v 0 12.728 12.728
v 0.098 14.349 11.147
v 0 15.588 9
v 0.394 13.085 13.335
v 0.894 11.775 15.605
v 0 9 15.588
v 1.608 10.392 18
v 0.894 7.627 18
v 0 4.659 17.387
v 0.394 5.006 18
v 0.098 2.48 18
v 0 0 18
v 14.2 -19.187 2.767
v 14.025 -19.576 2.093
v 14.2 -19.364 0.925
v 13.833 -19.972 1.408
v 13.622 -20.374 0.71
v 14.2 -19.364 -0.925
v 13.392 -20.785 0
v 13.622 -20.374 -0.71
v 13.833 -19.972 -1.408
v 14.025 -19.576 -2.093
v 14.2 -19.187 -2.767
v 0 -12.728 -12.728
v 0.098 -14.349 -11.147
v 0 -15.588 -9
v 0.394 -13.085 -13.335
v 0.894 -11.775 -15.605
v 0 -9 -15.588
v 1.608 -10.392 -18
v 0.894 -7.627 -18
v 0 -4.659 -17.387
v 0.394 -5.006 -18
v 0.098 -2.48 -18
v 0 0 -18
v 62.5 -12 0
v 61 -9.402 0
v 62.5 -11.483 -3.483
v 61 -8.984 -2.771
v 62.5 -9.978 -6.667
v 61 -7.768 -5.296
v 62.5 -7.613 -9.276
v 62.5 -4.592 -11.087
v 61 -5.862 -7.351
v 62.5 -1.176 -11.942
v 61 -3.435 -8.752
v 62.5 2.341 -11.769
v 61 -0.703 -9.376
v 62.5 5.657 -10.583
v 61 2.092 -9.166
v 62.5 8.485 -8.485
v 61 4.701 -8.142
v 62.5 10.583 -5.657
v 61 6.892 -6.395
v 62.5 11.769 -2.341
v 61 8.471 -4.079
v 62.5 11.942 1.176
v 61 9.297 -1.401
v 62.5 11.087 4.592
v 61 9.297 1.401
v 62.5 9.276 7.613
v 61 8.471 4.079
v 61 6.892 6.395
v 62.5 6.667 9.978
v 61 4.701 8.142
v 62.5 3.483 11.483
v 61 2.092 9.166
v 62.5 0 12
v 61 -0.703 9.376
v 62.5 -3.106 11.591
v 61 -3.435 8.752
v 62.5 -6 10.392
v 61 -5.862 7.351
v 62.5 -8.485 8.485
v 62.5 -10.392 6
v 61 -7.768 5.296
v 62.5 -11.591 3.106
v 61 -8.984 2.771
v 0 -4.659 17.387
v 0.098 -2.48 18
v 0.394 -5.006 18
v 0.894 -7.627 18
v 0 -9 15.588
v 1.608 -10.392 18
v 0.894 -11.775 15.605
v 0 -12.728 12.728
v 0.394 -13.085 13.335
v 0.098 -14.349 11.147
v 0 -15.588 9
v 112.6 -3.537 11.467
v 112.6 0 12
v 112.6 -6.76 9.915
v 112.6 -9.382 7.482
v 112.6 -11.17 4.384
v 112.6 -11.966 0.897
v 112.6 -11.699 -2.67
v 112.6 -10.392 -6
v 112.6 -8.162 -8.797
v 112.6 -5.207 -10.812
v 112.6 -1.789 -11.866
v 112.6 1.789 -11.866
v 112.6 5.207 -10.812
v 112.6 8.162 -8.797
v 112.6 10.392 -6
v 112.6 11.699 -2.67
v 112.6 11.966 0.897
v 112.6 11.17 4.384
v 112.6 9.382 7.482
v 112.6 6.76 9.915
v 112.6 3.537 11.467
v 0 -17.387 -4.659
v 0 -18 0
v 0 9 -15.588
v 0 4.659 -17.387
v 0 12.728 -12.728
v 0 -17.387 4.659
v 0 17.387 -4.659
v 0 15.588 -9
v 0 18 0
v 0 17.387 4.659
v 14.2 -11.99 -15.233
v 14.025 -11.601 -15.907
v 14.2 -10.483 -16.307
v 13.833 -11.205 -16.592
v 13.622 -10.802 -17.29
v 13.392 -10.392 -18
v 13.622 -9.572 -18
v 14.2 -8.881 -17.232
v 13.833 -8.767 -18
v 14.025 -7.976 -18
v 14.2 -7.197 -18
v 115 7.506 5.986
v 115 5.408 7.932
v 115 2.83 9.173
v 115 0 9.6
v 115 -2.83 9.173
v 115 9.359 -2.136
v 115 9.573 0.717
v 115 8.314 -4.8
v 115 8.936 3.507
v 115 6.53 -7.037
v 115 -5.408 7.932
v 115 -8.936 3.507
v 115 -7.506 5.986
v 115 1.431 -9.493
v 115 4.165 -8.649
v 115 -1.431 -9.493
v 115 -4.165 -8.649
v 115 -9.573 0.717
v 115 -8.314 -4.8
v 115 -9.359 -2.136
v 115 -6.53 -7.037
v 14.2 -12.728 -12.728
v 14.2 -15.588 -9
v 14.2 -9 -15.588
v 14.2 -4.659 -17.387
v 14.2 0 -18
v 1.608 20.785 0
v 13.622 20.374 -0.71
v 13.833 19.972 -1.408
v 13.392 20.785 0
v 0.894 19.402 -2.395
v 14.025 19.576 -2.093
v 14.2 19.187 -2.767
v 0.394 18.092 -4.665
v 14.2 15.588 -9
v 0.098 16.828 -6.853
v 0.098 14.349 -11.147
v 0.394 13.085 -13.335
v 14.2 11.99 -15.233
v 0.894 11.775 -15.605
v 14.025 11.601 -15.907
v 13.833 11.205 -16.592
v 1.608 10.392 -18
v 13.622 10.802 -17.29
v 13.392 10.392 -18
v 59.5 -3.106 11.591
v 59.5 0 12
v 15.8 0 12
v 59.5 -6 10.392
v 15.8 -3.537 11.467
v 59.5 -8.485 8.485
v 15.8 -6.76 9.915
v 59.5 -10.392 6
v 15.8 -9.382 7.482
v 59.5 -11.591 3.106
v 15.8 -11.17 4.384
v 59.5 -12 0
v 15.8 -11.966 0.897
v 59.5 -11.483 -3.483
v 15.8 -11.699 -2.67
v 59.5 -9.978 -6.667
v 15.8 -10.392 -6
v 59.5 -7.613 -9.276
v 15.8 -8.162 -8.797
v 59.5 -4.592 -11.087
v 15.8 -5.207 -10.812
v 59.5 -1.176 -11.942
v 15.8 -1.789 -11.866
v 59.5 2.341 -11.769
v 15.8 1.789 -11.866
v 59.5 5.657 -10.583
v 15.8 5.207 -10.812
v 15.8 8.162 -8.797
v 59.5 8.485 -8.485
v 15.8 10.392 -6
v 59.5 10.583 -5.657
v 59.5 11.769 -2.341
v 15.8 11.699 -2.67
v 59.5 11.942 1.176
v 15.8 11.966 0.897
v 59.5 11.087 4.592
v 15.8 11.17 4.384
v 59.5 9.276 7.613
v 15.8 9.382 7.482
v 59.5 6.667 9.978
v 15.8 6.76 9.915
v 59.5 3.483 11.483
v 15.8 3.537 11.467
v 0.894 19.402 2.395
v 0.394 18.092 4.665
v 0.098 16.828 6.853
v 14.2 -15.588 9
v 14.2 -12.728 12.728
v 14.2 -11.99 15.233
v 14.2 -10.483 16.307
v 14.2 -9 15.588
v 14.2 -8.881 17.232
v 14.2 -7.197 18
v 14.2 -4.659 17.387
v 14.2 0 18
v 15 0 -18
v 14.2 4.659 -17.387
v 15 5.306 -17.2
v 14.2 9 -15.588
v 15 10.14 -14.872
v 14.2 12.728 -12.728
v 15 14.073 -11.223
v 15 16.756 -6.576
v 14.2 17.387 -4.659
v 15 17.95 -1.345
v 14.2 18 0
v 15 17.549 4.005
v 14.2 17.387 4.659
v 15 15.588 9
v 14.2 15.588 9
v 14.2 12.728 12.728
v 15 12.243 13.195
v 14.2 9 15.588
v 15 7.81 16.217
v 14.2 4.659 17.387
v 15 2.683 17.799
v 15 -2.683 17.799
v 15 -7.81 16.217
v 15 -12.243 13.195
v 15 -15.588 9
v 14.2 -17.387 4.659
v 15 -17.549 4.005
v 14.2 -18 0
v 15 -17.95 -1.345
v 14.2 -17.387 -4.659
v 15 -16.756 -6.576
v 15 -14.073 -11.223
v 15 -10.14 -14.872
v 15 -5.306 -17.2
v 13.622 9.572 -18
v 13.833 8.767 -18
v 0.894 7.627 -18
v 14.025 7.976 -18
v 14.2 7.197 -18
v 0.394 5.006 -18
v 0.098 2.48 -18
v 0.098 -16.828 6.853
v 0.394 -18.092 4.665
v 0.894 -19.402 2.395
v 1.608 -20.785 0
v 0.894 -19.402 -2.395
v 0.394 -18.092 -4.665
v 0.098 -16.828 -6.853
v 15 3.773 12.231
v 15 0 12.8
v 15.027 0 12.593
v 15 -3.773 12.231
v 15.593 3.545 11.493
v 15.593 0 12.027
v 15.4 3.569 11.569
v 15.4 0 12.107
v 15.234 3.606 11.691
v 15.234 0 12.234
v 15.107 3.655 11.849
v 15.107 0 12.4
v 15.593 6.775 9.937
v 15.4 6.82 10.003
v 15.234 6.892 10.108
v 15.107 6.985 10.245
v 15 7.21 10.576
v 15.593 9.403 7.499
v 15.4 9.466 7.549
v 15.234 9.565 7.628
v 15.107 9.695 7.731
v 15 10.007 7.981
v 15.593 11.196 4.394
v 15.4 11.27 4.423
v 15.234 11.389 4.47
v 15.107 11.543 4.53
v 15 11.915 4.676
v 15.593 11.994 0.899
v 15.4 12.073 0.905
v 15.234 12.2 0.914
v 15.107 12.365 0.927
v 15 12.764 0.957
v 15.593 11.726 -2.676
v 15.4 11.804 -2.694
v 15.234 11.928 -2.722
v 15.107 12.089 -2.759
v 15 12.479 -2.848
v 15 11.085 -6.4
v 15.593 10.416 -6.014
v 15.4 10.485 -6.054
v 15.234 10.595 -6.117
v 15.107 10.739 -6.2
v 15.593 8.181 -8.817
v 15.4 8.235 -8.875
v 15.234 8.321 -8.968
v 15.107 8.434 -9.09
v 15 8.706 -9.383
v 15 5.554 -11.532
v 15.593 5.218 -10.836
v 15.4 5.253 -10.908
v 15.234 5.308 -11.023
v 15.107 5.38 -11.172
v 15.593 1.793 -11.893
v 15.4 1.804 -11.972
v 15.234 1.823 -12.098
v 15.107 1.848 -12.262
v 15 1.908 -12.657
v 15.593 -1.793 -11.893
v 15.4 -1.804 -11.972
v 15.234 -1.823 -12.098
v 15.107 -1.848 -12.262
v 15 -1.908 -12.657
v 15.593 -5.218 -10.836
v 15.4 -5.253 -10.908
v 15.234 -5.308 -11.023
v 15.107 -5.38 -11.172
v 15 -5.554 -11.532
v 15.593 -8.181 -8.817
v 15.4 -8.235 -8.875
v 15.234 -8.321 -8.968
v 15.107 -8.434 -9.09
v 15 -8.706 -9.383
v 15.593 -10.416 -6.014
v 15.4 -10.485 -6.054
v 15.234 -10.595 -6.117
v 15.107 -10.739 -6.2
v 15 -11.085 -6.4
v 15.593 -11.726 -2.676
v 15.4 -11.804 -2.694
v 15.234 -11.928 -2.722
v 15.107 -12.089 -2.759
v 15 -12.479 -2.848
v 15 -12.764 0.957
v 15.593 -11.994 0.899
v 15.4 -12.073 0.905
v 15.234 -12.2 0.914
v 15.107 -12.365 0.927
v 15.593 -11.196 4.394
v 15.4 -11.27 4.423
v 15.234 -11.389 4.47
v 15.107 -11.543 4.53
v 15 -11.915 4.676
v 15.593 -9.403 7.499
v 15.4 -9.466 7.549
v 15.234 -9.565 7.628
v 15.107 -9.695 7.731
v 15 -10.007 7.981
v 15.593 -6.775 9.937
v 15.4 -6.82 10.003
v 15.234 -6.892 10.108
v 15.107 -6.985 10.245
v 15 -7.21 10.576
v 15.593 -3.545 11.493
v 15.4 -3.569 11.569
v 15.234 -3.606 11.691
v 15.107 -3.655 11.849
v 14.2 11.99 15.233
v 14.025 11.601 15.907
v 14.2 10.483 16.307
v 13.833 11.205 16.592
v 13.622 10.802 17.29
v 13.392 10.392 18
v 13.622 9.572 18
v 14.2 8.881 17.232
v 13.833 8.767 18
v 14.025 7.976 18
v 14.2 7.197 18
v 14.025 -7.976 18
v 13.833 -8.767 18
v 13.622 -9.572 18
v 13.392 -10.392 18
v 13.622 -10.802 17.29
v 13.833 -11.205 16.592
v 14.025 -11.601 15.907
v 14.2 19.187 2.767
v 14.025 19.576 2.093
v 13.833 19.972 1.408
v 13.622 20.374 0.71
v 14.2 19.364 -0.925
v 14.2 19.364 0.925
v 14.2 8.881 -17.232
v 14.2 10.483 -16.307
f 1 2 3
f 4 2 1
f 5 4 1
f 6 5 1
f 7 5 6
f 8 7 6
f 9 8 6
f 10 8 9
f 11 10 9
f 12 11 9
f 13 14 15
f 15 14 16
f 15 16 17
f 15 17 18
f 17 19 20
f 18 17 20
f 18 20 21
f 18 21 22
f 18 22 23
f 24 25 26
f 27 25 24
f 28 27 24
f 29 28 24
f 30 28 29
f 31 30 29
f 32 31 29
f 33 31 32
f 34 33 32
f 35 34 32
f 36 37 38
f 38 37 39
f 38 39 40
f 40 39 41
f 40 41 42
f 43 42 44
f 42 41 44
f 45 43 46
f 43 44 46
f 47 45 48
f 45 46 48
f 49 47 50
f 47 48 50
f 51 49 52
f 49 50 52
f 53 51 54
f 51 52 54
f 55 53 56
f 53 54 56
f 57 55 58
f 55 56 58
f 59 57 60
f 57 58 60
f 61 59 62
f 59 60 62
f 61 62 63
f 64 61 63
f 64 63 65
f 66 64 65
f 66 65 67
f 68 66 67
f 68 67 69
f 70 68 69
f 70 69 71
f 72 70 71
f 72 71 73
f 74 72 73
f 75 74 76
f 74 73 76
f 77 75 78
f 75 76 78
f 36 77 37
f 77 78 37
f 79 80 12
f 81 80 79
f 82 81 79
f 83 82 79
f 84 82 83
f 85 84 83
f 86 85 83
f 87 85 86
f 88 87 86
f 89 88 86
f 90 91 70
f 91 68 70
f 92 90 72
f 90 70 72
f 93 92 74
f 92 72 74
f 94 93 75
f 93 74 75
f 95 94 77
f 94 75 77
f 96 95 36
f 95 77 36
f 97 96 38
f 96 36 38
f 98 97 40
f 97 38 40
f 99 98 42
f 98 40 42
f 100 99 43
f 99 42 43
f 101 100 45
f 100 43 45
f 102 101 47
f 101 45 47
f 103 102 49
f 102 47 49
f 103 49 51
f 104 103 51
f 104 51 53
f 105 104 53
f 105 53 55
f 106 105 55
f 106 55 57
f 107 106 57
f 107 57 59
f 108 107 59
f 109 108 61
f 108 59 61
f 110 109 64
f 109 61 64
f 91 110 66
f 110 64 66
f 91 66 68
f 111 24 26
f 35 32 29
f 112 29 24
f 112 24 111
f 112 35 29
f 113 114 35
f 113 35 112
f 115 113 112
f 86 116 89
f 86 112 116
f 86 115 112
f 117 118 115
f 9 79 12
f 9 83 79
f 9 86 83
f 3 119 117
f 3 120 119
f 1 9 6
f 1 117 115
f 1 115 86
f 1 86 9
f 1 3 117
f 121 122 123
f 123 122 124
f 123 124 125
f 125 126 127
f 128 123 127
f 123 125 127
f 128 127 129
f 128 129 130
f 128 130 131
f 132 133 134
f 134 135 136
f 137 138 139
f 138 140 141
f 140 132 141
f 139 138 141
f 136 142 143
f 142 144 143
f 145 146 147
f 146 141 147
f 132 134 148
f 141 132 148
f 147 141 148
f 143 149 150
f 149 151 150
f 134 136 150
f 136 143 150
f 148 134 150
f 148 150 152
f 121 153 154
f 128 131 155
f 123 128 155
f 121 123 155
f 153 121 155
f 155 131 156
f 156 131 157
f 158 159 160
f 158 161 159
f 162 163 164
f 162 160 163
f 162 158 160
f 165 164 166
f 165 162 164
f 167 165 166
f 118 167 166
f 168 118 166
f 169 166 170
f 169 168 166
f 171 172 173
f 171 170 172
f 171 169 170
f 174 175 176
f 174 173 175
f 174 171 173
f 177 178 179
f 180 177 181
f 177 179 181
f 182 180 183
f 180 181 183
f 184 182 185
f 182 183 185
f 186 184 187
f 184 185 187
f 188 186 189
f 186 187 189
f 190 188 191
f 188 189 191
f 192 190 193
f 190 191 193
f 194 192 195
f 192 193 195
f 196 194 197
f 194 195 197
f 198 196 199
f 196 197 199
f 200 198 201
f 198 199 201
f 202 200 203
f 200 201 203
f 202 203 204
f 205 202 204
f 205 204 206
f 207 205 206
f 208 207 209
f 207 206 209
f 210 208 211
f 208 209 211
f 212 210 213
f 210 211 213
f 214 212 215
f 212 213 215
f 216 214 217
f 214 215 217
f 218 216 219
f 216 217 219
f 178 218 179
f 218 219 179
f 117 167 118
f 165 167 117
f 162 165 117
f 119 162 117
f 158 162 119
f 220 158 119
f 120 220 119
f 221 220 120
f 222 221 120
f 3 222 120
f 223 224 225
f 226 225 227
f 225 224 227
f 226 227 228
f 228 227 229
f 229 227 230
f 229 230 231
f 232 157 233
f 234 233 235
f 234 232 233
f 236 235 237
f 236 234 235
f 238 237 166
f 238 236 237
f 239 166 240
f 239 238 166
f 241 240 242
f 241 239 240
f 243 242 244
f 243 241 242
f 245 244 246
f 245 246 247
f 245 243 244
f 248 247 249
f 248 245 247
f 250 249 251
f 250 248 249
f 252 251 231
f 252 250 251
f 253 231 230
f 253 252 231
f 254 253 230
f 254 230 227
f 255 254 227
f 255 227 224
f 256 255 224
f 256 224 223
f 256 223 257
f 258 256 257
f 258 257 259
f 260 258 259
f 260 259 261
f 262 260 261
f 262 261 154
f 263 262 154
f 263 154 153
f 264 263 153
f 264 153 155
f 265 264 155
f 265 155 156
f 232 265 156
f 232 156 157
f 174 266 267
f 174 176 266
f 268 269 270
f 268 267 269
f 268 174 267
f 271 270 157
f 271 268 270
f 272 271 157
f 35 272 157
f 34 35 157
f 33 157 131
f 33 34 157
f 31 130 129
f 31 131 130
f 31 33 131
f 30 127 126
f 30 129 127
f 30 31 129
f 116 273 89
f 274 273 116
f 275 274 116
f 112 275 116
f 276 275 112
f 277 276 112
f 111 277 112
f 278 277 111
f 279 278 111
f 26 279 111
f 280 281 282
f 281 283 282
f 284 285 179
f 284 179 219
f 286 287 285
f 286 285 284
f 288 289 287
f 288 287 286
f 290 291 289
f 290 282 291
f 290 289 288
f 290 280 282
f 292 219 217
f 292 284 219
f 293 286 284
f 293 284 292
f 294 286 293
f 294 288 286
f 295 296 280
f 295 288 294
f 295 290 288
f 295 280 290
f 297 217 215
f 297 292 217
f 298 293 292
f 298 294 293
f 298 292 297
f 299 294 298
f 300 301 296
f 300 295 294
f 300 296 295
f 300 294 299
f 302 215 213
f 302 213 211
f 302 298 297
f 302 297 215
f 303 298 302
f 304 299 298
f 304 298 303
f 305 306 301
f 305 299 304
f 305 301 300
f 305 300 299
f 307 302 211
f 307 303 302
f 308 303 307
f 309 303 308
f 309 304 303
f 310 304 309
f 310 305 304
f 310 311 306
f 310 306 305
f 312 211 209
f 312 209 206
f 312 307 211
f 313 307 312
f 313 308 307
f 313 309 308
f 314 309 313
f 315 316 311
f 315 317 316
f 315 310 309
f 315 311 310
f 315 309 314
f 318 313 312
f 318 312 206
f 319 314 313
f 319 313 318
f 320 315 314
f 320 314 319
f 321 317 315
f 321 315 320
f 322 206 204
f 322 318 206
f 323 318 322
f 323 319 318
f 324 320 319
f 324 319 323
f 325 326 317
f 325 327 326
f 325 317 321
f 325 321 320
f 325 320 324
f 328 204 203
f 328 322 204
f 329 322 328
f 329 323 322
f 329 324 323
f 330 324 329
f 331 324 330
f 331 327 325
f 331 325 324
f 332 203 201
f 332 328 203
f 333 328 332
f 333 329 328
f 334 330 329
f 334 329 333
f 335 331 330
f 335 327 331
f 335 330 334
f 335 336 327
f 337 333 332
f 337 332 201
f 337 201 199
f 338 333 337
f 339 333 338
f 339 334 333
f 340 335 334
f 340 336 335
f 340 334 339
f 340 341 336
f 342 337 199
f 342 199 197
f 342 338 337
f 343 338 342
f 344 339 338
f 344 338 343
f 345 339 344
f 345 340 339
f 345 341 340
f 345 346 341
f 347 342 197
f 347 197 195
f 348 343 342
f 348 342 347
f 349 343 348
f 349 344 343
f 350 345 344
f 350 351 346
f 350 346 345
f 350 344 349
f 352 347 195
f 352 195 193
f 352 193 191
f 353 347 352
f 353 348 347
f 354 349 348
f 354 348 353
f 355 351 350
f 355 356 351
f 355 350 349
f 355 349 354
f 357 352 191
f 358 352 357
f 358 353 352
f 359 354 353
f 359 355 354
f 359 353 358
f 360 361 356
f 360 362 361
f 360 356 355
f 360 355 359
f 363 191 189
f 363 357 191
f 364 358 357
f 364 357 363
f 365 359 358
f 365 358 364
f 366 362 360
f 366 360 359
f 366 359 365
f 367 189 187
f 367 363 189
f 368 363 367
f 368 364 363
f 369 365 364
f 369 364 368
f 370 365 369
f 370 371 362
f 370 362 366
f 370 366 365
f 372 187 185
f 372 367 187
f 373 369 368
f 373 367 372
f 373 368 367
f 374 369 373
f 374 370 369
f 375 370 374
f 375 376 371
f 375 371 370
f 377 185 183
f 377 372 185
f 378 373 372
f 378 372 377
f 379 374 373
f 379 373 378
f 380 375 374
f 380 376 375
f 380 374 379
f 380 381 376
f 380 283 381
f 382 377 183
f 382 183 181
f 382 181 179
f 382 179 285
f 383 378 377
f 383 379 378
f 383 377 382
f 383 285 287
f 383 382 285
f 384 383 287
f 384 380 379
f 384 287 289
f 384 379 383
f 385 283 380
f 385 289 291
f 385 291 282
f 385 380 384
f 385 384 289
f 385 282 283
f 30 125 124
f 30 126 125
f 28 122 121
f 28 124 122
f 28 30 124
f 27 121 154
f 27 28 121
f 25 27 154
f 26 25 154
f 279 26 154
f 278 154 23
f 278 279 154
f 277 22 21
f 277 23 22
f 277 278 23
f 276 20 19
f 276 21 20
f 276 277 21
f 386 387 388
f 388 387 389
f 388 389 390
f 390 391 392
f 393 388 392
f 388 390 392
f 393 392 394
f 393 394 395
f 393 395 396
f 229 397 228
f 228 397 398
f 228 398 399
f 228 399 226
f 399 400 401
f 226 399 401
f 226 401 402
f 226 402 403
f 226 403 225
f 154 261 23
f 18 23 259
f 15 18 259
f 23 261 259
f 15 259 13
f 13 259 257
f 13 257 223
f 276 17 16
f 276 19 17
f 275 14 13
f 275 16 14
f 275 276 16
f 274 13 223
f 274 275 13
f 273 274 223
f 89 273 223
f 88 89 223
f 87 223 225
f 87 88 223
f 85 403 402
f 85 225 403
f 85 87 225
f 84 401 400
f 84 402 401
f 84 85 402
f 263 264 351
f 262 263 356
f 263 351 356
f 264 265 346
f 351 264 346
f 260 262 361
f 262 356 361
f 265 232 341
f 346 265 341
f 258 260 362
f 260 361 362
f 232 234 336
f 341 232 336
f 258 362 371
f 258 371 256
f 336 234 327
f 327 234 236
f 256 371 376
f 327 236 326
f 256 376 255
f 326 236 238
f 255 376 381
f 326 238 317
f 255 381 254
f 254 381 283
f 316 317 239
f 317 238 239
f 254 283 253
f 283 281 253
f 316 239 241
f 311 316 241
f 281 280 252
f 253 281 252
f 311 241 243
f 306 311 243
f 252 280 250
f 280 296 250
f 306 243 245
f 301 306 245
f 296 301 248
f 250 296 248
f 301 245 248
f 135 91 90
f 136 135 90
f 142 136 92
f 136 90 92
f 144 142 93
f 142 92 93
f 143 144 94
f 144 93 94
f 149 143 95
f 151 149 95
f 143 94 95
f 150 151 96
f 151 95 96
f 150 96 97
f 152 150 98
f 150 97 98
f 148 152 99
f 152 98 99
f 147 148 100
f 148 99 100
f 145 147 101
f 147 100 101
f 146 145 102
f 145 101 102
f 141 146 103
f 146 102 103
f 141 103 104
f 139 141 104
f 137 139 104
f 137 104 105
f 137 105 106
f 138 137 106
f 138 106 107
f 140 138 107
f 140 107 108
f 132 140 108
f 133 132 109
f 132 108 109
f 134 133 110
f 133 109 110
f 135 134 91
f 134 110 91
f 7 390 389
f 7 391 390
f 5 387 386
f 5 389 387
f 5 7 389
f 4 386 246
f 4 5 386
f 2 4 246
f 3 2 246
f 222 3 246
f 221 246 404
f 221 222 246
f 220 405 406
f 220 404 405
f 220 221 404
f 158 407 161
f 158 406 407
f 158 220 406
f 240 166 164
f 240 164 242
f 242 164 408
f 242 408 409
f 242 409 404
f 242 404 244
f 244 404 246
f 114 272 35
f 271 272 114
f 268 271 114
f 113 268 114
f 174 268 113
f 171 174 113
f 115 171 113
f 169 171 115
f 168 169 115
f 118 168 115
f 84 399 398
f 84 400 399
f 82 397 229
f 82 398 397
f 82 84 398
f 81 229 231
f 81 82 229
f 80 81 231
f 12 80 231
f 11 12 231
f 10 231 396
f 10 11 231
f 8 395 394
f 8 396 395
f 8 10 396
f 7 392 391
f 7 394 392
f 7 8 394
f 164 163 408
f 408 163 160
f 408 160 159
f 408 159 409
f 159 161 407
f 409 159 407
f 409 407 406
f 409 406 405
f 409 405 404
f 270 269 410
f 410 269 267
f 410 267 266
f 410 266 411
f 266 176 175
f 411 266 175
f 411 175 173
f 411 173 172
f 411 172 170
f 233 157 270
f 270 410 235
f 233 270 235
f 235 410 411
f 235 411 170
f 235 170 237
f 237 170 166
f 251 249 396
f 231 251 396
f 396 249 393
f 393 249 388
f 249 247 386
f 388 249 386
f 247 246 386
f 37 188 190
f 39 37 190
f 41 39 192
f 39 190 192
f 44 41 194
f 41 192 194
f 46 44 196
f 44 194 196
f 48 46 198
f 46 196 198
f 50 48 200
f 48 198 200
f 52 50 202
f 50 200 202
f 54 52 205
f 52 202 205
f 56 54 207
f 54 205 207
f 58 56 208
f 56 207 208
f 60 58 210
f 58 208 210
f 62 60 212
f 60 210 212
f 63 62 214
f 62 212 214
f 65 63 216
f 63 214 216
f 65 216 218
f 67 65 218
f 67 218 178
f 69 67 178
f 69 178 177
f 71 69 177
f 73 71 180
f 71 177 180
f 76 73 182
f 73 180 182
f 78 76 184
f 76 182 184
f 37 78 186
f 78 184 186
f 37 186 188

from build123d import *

# Parameters (mm, degrees)
EXTRUDE_384_DEPTH = 15
SKETCH_4_W        = 0.8
SKETCH_4_H        = 12.784609691
CHAMFER_2079_SIZE = 2.4
FILLET_2121_R     = 0.8


with BuildPart() as part:
    # 草图1 → Extrude 384 (new body)
    with BuildSketch(Plane(origin=(0, 0, 0), x_dir=(0, 0, -1), z_dir=(1, 0, 0))):
        Polygon((18, 10.392304845), (18, -10.392304845), (0, -20.784609691), (-18, -10.392304845), (-18, 10.392304845), (0, 20.784609691), align=None)
    extrude(amount=EXTRUDE_384_DEPTH)

    # 草图2 → 凸台-旋转1 (revolve)
    with BuildSketch(Plane.XY, mode=Mode.PRIVATE) as revolve_1_sk:
        Polygon((0, 0), (115, 0), (115, 9.402), (115, 12), (27.8072, 12), (0, 12), align=None)
    revolve(revolve_1_sk.sketch.rotate(Axis((0, 0, 0), (1, 0, 0)), 90), axis=Axis((0, 0, 0), (1, 0, 0)))

    # 草图3 → 切除-旋转1 (revolve, cut)
    with BuildSketch(Plane.XY):
        Polygon((0, 18), (4.494446501, 25.784609691), (4.494446501, 30.784609691), (-10, 30.784609691), (-10, 18), align=None)
    revolve(axis=Axis((0, 0, 0), (1, 0, 0)), mode=Mode.SUBTRACT)

    # 草图5 → 切除-旋转2 (revolve, cut)
    with BuildSketch(Plane.XY):
        Polygon((15, 18), (10.505553499, 25.784609691), (10.505553499, 30.784609691), (20.505553499, 30.784609691), (20.505553499, 18), align=None)
    revolve(axis=Axis((0, 0, 0), (1, 0, 0)), mode=Mode.SUBTRACT)

    # 草图4 → 切除-旋转3 (revolve, cut)
    with BuildSketch(Plane.XY, mode=Mode.PRIVATE) as cut_revolve_3_sk:
        with Locations((14.6, 24.392304845)):
            Rectangle(SKETCH_4_W, SKETCH_4_H)
    revolve(cut_revolve_3_sk.sketch.rotate(Axis((0, 0, 0), (1, 0, 0)), 270), axis=Axis((0, 0, 0), (1, 0, 0)), mode=Mode.SUBTRACT)

    # Chamfer 2079
    chamfer_2079_edges = [part.edges().sort_by_distance(p)[0] for p in [
        (115, 0, -12),
    ]]
    chamfer(chamfer_2079_edges, length=CHAMFER_2079_SIZE)

    # Fillet 2121
    fillet_2121_edges = [part.edges().sort_by_distance(p)[0] for p in [
        (15, 0, -12),
    ]]
    fillet(fillet_2121_edges, radius=FILLET_2121_R)

    # 草图6 → 切除-旋转4 (revolve, cut)
    with BuildSketch(Plane.XY):
        Polygon((61, -9.402), (59.500044001, -12), (59.500044001, -15), (62.499955999, -15), (62.499955999, -12), align=None)
    revolve(axis=Axis((-3.175, 0, 0), (1, 0, 0)), mode=Mode.SUBTRACT)


solid = part.part
